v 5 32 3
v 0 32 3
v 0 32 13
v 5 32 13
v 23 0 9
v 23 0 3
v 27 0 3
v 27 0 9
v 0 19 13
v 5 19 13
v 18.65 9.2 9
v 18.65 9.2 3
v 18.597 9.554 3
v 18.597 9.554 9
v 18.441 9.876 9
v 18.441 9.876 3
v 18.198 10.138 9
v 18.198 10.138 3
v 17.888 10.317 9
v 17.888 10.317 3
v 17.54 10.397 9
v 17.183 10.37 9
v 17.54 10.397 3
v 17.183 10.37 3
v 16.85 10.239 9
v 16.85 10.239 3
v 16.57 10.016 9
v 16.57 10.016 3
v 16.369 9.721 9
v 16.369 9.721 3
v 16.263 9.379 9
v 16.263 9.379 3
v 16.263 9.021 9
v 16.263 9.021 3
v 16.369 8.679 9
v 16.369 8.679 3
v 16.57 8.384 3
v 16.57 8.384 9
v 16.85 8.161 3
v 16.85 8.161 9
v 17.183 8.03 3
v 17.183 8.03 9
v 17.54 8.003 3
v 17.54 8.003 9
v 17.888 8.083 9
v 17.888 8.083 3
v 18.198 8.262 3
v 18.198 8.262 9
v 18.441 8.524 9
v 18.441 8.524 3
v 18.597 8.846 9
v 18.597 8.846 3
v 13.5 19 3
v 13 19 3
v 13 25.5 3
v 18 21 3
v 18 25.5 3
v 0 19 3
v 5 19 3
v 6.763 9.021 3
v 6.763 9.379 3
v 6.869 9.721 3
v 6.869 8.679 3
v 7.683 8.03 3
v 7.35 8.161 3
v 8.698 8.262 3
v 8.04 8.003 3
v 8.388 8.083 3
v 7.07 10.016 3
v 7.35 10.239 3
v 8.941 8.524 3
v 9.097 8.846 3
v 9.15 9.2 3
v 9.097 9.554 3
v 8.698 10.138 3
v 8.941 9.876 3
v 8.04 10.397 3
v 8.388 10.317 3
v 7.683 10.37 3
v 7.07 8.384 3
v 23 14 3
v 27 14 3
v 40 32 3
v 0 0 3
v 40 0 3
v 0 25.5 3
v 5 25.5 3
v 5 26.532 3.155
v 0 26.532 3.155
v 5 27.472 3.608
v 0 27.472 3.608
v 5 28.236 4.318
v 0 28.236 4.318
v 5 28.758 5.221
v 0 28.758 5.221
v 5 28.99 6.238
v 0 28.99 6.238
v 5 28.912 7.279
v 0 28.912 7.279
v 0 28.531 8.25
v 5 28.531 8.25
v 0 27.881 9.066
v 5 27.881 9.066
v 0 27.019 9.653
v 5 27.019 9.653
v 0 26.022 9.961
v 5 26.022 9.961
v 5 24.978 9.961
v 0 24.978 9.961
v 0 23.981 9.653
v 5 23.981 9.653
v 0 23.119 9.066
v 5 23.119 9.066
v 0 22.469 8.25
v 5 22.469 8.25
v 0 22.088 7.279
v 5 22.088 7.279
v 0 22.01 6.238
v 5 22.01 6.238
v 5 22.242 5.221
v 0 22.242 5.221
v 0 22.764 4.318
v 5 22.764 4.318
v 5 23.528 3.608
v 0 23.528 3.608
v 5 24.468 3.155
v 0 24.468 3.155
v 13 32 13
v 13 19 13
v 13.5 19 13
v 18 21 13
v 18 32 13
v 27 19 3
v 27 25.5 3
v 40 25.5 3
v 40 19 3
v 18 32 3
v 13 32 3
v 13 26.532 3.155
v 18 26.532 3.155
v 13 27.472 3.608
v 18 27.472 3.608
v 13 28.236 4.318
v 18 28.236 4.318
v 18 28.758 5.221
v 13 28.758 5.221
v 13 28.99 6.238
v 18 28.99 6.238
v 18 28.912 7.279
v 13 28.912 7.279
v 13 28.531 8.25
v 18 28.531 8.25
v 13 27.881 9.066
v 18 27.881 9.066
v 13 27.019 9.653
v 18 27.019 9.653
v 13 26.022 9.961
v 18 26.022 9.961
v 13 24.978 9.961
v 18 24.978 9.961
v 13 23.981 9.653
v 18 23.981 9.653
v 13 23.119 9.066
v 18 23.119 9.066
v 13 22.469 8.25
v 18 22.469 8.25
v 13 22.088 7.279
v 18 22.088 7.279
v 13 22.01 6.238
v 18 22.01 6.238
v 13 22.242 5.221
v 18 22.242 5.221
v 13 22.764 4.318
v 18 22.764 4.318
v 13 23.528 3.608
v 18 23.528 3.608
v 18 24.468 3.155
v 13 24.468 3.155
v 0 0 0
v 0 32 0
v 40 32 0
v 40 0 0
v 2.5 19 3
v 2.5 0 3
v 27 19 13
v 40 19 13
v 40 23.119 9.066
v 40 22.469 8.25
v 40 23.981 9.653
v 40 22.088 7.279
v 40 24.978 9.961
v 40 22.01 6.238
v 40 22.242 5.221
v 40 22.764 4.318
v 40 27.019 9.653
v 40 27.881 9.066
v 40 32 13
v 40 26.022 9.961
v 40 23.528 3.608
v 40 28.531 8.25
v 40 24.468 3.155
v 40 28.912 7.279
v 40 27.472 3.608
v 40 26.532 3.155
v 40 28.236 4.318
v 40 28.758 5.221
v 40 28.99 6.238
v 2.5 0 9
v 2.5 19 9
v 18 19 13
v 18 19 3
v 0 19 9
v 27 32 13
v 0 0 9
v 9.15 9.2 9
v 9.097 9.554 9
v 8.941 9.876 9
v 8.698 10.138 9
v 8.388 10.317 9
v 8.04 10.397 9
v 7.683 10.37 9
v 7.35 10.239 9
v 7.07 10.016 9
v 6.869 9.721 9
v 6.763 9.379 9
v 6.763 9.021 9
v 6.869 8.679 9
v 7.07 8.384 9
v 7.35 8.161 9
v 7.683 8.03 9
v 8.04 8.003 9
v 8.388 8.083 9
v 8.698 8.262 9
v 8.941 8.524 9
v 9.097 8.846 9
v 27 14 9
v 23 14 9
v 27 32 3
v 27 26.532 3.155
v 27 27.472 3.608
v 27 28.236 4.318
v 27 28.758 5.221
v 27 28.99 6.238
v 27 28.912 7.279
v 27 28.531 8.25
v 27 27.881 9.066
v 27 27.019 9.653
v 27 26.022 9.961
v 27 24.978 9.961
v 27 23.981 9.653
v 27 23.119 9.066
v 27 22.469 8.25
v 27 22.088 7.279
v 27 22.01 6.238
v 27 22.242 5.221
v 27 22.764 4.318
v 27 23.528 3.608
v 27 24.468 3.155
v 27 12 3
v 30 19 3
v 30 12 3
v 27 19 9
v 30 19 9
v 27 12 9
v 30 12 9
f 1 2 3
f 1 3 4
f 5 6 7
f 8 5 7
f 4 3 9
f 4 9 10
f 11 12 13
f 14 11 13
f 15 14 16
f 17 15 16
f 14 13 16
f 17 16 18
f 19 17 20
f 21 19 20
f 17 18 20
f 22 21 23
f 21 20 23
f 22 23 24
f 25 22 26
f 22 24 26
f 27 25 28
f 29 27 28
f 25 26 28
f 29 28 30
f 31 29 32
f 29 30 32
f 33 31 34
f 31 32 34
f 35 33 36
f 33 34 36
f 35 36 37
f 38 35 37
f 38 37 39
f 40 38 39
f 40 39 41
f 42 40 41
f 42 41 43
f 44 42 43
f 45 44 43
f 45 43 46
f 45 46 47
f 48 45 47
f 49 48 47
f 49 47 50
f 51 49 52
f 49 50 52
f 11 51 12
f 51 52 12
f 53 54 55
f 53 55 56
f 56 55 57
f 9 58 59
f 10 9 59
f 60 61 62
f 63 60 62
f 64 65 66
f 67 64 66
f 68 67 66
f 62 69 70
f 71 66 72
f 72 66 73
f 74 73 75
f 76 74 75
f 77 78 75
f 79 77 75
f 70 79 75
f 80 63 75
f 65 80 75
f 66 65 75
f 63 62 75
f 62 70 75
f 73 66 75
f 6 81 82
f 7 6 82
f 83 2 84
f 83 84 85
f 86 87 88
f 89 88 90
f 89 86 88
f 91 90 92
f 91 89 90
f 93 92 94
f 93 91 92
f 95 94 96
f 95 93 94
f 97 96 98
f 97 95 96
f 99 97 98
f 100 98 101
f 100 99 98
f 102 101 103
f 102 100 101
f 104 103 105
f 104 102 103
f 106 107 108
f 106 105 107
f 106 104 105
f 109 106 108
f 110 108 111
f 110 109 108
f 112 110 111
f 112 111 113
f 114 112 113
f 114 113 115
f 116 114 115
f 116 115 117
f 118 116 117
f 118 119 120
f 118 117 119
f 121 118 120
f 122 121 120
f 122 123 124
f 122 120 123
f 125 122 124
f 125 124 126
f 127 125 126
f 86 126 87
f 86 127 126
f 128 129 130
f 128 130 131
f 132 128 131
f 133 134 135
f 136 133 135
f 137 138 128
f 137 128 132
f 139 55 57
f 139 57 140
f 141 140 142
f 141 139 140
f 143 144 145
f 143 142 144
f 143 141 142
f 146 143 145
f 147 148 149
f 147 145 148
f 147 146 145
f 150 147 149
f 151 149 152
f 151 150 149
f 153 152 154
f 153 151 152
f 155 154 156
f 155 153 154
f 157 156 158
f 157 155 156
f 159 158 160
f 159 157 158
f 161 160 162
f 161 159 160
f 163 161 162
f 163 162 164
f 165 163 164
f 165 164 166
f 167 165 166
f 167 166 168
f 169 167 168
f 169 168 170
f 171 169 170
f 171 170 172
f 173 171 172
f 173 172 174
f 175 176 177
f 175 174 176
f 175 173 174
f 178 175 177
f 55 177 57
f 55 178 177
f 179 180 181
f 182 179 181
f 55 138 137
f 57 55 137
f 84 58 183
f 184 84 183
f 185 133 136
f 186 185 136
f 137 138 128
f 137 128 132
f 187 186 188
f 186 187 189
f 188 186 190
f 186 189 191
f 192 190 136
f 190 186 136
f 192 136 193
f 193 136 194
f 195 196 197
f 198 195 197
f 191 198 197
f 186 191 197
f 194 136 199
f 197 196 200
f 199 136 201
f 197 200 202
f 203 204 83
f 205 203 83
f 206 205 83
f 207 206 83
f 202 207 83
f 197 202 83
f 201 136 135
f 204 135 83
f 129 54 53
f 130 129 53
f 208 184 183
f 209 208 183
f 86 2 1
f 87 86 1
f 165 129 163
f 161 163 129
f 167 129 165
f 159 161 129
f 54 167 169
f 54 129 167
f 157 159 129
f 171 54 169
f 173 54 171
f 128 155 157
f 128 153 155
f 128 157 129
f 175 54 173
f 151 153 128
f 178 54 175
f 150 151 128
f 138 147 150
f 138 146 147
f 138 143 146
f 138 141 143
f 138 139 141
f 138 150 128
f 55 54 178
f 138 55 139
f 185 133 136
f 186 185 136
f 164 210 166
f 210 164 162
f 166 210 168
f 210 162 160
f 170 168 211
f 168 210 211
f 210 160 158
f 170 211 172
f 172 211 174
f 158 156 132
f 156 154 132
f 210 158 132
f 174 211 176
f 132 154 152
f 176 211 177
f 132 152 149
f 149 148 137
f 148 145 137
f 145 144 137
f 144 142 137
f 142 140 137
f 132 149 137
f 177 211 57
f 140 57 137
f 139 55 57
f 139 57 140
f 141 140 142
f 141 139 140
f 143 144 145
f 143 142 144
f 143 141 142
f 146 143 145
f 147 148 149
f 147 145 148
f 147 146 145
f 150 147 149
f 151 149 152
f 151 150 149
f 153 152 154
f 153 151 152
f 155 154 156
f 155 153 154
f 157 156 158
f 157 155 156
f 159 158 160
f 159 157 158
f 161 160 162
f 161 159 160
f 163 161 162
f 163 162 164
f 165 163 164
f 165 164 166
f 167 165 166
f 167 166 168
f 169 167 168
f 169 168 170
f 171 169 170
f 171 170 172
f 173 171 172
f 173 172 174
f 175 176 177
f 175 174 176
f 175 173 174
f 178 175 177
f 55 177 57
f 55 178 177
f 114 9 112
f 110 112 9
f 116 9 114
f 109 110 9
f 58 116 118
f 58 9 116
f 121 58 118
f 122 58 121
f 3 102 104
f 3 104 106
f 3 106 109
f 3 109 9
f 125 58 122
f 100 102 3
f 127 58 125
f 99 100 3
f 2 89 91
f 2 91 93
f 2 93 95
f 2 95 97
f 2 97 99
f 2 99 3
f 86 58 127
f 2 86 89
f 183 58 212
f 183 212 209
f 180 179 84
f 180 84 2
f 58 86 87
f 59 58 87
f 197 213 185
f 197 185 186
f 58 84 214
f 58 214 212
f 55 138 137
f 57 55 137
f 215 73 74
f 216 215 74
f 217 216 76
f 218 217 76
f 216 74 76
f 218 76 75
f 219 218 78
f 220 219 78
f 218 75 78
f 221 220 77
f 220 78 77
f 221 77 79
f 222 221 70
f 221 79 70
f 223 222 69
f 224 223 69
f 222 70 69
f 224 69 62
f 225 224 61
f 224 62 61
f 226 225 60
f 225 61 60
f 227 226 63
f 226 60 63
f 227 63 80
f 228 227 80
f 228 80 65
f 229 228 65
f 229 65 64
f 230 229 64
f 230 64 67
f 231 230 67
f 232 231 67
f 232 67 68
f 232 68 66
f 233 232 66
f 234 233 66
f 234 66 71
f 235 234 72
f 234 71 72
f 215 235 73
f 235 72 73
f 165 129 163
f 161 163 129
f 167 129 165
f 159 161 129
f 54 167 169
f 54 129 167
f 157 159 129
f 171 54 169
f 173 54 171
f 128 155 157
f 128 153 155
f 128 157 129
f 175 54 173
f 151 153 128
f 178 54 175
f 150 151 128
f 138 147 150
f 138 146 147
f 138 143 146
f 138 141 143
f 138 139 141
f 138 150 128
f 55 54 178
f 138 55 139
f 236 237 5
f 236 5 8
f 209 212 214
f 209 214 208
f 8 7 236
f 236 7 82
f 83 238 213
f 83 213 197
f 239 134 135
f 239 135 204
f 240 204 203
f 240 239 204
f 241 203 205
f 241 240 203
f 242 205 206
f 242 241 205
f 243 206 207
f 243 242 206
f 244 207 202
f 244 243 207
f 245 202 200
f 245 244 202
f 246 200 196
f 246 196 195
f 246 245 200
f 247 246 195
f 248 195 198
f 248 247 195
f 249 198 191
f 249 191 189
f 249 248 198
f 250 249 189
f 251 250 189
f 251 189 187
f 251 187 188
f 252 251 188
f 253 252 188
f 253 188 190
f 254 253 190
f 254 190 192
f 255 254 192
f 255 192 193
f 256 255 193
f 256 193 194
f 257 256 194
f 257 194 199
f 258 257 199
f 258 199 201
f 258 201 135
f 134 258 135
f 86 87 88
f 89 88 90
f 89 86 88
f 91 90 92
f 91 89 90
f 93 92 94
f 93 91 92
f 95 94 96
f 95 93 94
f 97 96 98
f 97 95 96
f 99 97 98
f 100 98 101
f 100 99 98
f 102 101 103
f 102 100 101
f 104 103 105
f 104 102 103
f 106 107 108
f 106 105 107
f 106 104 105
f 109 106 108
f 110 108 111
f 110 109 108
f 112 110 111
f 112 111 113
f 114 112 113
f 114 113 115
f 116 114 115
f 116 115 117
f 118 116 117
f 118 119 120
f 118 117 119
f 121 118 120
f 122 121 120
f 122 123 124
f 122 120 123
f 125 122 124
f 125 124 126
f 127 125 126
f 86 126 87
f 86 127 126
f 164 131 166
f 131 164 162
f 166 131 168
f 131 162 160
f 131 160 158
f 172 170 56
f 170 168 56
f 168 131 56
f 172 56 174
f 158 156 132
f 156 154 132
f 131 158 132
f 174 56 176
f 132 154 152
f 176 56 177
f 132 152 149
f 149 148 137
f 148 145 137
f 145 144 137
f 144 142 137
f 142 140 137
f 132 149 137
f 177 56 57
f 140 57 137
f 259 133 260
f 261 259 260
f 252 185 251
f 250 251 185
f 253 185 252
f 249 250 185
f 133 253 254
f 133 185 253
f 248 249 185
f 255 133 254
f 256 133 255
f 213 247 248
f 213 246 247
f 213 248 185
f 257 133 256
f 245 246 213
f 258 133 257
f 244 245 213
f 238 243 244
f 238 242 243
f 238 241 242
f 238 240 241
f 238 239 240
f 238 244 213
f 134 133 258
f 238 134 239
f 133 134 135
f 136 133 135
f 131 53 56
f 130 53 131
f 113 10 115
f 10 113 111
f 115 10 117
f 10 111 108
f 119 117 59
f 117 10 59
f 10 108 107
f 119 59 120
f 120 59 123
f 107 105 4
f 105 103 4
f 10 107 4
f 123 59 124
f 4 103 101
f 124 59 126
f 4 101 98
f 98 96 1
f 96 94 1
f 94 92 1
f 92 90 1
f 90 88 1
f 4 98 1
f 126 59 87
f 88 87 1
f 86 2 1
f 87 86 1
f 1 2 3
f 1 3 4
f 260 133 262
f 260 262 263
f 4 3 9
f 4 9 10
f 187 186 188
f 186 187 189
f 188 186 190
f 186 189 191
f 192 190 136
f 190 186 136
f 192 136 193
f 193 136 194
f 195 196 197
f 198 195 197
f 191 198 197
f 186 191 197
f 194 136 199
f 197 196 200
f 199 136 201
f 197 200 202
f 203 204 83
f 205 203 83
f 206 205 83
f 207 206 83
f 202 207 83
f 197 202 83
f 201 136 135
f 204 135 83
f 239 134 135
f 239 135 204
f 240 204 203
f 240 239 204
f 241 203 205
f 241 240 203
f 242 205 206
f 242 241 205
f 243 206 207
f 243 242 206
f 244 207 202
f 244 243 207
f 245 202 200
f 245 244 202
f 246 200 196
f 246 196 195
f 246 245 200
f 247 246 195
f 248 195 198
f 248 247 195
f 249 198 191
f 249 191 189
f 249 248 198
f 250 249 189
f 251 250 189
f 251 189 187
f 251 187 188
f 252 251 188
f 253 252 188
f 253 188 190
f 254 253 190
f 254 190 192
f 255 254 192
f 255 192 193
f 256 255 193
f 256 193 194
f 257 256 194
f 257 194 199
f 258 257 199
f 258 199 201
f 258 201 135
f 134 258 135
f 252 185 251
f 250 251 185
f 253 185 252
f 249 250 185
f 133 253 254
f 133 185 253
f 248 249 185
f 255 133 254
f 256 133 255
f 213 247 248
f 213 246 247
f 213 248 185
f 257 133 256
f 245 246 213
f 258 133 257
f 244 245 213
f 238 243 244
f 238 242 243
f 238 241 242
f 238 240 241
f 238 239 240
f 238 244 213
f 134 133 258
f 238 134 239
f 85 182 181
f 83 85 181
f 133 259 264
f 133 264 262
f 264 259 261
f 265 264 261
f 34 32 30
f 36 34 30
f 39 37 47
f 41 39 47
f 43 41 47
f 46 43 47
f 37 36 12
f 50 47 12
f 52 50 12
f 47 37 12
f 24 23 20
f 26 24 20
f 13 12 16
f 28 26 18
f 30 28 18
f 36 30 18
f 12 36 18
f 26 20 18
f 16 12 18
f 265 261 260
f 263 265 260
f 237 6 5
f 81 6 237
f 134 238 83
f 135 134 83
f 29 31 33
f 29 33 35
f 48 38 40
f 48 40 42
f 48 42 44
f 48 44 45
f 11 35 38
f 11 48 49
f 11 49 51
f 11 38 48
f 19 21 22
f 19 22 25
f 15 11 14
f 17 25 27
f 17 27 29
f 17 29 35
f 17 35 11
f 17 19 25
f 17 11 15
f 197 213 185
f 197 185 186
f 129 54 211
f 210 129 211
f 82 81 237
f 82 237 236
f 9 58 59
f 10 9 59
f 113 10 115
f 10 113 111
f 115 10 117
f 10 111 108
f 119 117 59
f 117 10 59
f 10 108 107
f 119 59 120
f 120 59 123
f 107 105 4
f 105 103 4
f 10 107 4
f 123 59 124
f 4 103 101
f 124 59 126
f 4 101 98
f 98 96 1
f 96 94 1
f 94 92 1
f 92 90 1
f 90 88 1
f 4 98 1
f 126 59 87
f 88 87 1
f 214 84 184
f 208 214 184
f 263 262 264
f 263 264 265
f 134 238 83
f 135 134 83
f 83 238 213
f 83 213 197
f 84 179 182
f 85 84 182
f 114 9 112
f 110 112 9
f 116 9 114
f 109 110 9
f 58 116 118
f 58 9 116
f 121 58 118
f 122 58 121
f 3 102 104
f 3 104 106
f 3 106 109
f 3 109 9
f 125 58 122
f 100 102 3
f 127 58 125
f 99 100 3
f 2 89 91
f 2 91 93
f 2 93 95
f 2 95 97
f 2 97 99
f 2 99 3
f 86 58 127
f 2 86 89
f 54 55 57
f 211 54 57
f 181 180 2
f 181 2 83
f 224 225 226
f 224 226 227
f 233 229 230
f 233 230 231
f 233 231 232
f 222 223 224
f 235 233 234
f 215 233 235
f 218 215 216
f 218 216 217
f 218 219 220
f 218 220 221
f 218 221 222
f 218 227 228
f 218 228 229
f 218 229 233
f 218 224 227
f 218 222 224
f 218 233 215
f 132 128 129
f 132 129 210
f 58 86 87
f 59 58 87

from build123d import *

# Parameters (mm, degrees)
BOX_W             = 40
BOX_H             = 32
BOX_DEPTH         = 3
BOX004_W          = 4
BOX004_H          = 14
BOX004_DEPTH      = 6
BOX005_W          = 2.5
BOX005_H          = 19
BOX005_DEPTH      = 6
CYLINDER002_R     = 1.2
CYLINDER002_DEPTH = 6
CYLINDER001_R     = 1.2
CYLINDER001_DEPTH = 6
CYLINDER_R        = 3.5
CYLINDER_DEPTH    = 40
BOX002_W          = 5
BOX002_H          = 13
BOX002_DEPTH      = 10
BOX003_W          = 13
BOX003_H          = 13
BOX003_DEPTH      = 10
BOX001_W          = 5
BOX001_H          = 13
BOX001_DEPTH      = 10
BOX006_W          = 3
BOX006_H          = 7
BOX006_DEPTH      = 6
CHAMFER_SIZE2     = 4.5
CHAMFER_SIZE      = 2


with BuildPart() as base_plate:
    # Box → Box (new body)
    with BuildSketch(Plane.XY):
        with Locations((20, 16)):
            Rectangle(BOX_W, BOX_H)
    extrude(amount=BOX_DEPTH)


with BuildPart() as switch_wall_right:
    # Box004 → Box004 (new body)
    with BuildSketch(Plane(origin=(23, 0, 3), x_dir=(1, 0, 0), z_dir=(0, 0, 1))):
        with Locations((2, 7)):
            Rectangle(BOX004_W, BOX004_H)
    extrude(amount=BOX004_DEPTH)


with BuildPart() as switch_wall_left:
    # Box005 → Box005 (new body)
    with BuildSketch(Plane.XY.offset(3)):
        with Locations((1.25, 9.5)):
            Rectangle(BOX005_W, BOX005_H)
    extrude(amount=BOX005_DEPTH)


with BuildPart() as cylinder002:
    # Cylinder002 → Cylinder002 (new body)
    with BuildSketch(Plane(origin=(17.45, 2.5, 0), x_dir=(1, 0, 0), z_dir=(0, 0, 1))):
        Circle(CYLINDER002_R)
    extrude(amount=CYLINDER002_DEPTH)


with BuildPart() as switch_pins:
    # Cylinder001 → Cylinder001 (new body)
    with BuildSketch(Plane(origin=(7.95, 2.5, 0), x_dir=(1, 0, 0), z_dir=(0, 0, 1))):
        Circle(CYLINDER001_R)
    extrude(amount=CYLINDER001_DEPTH)

    # Fusion: union Cylinder002
    add(cylinder002.part)


with BuildPart() as switch_pins_1:
    # Fusion placement: moved
    add(switch_pins.part.moved(Location((0, 6.7, 3))))


with BuildPart() as locking_pin_model:
    # Cylinder → Cylinder (new body)
    with BuildSketch(Plane(origin=(0, 25.5, 6.5), x_dir=(0, 0, -1), z_dir=(1, 0, 0))):
        Circle(CYLINDER_R)
    extrude(amount=CYLINDER_DEPTH)


with BuildPart() as box002:
    # Box002 → Box002 (new body)
    with BuildSketch(Plane(origin=(13, 19, 3), x_dir=(1, 0, 0), z_dir=(0, 0, 1))):
        with Locations((2.5, 6.5)):
            Rectangle(BOX002_W, BOX002_H)
    extrude(amount=BOX002_DEPTH)


with BuildPart() as box003:
    # Box003 → Box003 (new body)
    with BuildSketch(Plane(origin=(27, 19, 3), x_dir=(1, 0, 0), z_dir=(0, 0, 1))):
        with Locations((6.5, 6.5)):
            Rectangle(BOX003_W, BOX003_H)
    extrude(amount=BOX003_DEPTH)


with BuildPart() as box001:
    # Box001 → Box001 (new body)
    with BuildSketch(Plane(origin=(0, 19, 3), x_dir=(1, 0, 0), z_dir=(0, 0, 1))):
        with Locations((2.5, 6.5)):
            Rectangle(BOX001_W, BOX001_H)
    extrude(amount=BOX001_DEPTH)


with BuildPart() as pin_blocks_holed_deprecated:
    # Fusion001 base: copy of Box001
    add(box001.part)

    # Fusion001: union Box002, Box003
    add(box002.part)
    add(box003.part)

    # Cut: cut Locking Pin Model
    add(locking_pin_model.part, mode=Mode.SUBTRACT)


with BuildPart() as dust_cover_block:
    # Box006 → Box006 (new body)
    with BuildSketch(Plane(origin=(27, 12, 3), x_dir=(1, 0, 0), z_dir=(0, 0, 1))):
        with Locations((1.5, 3.5)):
            Rectangle(BOX006_W, BOX006_H)
    extrude(amount=BOX006_DEPTH)


with BuildPart() as pin_blocks_holed:
    # Chamfer base: copy of Box002
    add(box002.part)

    # Chamfer
    chamfer_edges = [pin_blocks_holed.edges().sort_by_distance(p)[0] for p in [
        (18, 19, 8),
    ]]
    chamfer_side = pin_blocks_holed.faces().sort_by_distance((18, 25.5, 8))[0]
    chamfer(chamfer_edges, length=CHAMFER_SIZE, length2=CHAMFER_SIZE2, reference=chamfer_side)

    # Fusion002: union Box001, Box003
    add(box001.part)
    add(box003.part)

    # Cut001: cut Locking Pin Model
    add(locking_pin_model.part, mode=Mode.SUBTRACT)


solid = Compound([base_plate.part, switch_wall_right.part, switch_wall_left.part, switch_pins_1.part, pin_blocks_holed_deprecated.part, dust_cover_block.part, pin_blocks_holed.part])
